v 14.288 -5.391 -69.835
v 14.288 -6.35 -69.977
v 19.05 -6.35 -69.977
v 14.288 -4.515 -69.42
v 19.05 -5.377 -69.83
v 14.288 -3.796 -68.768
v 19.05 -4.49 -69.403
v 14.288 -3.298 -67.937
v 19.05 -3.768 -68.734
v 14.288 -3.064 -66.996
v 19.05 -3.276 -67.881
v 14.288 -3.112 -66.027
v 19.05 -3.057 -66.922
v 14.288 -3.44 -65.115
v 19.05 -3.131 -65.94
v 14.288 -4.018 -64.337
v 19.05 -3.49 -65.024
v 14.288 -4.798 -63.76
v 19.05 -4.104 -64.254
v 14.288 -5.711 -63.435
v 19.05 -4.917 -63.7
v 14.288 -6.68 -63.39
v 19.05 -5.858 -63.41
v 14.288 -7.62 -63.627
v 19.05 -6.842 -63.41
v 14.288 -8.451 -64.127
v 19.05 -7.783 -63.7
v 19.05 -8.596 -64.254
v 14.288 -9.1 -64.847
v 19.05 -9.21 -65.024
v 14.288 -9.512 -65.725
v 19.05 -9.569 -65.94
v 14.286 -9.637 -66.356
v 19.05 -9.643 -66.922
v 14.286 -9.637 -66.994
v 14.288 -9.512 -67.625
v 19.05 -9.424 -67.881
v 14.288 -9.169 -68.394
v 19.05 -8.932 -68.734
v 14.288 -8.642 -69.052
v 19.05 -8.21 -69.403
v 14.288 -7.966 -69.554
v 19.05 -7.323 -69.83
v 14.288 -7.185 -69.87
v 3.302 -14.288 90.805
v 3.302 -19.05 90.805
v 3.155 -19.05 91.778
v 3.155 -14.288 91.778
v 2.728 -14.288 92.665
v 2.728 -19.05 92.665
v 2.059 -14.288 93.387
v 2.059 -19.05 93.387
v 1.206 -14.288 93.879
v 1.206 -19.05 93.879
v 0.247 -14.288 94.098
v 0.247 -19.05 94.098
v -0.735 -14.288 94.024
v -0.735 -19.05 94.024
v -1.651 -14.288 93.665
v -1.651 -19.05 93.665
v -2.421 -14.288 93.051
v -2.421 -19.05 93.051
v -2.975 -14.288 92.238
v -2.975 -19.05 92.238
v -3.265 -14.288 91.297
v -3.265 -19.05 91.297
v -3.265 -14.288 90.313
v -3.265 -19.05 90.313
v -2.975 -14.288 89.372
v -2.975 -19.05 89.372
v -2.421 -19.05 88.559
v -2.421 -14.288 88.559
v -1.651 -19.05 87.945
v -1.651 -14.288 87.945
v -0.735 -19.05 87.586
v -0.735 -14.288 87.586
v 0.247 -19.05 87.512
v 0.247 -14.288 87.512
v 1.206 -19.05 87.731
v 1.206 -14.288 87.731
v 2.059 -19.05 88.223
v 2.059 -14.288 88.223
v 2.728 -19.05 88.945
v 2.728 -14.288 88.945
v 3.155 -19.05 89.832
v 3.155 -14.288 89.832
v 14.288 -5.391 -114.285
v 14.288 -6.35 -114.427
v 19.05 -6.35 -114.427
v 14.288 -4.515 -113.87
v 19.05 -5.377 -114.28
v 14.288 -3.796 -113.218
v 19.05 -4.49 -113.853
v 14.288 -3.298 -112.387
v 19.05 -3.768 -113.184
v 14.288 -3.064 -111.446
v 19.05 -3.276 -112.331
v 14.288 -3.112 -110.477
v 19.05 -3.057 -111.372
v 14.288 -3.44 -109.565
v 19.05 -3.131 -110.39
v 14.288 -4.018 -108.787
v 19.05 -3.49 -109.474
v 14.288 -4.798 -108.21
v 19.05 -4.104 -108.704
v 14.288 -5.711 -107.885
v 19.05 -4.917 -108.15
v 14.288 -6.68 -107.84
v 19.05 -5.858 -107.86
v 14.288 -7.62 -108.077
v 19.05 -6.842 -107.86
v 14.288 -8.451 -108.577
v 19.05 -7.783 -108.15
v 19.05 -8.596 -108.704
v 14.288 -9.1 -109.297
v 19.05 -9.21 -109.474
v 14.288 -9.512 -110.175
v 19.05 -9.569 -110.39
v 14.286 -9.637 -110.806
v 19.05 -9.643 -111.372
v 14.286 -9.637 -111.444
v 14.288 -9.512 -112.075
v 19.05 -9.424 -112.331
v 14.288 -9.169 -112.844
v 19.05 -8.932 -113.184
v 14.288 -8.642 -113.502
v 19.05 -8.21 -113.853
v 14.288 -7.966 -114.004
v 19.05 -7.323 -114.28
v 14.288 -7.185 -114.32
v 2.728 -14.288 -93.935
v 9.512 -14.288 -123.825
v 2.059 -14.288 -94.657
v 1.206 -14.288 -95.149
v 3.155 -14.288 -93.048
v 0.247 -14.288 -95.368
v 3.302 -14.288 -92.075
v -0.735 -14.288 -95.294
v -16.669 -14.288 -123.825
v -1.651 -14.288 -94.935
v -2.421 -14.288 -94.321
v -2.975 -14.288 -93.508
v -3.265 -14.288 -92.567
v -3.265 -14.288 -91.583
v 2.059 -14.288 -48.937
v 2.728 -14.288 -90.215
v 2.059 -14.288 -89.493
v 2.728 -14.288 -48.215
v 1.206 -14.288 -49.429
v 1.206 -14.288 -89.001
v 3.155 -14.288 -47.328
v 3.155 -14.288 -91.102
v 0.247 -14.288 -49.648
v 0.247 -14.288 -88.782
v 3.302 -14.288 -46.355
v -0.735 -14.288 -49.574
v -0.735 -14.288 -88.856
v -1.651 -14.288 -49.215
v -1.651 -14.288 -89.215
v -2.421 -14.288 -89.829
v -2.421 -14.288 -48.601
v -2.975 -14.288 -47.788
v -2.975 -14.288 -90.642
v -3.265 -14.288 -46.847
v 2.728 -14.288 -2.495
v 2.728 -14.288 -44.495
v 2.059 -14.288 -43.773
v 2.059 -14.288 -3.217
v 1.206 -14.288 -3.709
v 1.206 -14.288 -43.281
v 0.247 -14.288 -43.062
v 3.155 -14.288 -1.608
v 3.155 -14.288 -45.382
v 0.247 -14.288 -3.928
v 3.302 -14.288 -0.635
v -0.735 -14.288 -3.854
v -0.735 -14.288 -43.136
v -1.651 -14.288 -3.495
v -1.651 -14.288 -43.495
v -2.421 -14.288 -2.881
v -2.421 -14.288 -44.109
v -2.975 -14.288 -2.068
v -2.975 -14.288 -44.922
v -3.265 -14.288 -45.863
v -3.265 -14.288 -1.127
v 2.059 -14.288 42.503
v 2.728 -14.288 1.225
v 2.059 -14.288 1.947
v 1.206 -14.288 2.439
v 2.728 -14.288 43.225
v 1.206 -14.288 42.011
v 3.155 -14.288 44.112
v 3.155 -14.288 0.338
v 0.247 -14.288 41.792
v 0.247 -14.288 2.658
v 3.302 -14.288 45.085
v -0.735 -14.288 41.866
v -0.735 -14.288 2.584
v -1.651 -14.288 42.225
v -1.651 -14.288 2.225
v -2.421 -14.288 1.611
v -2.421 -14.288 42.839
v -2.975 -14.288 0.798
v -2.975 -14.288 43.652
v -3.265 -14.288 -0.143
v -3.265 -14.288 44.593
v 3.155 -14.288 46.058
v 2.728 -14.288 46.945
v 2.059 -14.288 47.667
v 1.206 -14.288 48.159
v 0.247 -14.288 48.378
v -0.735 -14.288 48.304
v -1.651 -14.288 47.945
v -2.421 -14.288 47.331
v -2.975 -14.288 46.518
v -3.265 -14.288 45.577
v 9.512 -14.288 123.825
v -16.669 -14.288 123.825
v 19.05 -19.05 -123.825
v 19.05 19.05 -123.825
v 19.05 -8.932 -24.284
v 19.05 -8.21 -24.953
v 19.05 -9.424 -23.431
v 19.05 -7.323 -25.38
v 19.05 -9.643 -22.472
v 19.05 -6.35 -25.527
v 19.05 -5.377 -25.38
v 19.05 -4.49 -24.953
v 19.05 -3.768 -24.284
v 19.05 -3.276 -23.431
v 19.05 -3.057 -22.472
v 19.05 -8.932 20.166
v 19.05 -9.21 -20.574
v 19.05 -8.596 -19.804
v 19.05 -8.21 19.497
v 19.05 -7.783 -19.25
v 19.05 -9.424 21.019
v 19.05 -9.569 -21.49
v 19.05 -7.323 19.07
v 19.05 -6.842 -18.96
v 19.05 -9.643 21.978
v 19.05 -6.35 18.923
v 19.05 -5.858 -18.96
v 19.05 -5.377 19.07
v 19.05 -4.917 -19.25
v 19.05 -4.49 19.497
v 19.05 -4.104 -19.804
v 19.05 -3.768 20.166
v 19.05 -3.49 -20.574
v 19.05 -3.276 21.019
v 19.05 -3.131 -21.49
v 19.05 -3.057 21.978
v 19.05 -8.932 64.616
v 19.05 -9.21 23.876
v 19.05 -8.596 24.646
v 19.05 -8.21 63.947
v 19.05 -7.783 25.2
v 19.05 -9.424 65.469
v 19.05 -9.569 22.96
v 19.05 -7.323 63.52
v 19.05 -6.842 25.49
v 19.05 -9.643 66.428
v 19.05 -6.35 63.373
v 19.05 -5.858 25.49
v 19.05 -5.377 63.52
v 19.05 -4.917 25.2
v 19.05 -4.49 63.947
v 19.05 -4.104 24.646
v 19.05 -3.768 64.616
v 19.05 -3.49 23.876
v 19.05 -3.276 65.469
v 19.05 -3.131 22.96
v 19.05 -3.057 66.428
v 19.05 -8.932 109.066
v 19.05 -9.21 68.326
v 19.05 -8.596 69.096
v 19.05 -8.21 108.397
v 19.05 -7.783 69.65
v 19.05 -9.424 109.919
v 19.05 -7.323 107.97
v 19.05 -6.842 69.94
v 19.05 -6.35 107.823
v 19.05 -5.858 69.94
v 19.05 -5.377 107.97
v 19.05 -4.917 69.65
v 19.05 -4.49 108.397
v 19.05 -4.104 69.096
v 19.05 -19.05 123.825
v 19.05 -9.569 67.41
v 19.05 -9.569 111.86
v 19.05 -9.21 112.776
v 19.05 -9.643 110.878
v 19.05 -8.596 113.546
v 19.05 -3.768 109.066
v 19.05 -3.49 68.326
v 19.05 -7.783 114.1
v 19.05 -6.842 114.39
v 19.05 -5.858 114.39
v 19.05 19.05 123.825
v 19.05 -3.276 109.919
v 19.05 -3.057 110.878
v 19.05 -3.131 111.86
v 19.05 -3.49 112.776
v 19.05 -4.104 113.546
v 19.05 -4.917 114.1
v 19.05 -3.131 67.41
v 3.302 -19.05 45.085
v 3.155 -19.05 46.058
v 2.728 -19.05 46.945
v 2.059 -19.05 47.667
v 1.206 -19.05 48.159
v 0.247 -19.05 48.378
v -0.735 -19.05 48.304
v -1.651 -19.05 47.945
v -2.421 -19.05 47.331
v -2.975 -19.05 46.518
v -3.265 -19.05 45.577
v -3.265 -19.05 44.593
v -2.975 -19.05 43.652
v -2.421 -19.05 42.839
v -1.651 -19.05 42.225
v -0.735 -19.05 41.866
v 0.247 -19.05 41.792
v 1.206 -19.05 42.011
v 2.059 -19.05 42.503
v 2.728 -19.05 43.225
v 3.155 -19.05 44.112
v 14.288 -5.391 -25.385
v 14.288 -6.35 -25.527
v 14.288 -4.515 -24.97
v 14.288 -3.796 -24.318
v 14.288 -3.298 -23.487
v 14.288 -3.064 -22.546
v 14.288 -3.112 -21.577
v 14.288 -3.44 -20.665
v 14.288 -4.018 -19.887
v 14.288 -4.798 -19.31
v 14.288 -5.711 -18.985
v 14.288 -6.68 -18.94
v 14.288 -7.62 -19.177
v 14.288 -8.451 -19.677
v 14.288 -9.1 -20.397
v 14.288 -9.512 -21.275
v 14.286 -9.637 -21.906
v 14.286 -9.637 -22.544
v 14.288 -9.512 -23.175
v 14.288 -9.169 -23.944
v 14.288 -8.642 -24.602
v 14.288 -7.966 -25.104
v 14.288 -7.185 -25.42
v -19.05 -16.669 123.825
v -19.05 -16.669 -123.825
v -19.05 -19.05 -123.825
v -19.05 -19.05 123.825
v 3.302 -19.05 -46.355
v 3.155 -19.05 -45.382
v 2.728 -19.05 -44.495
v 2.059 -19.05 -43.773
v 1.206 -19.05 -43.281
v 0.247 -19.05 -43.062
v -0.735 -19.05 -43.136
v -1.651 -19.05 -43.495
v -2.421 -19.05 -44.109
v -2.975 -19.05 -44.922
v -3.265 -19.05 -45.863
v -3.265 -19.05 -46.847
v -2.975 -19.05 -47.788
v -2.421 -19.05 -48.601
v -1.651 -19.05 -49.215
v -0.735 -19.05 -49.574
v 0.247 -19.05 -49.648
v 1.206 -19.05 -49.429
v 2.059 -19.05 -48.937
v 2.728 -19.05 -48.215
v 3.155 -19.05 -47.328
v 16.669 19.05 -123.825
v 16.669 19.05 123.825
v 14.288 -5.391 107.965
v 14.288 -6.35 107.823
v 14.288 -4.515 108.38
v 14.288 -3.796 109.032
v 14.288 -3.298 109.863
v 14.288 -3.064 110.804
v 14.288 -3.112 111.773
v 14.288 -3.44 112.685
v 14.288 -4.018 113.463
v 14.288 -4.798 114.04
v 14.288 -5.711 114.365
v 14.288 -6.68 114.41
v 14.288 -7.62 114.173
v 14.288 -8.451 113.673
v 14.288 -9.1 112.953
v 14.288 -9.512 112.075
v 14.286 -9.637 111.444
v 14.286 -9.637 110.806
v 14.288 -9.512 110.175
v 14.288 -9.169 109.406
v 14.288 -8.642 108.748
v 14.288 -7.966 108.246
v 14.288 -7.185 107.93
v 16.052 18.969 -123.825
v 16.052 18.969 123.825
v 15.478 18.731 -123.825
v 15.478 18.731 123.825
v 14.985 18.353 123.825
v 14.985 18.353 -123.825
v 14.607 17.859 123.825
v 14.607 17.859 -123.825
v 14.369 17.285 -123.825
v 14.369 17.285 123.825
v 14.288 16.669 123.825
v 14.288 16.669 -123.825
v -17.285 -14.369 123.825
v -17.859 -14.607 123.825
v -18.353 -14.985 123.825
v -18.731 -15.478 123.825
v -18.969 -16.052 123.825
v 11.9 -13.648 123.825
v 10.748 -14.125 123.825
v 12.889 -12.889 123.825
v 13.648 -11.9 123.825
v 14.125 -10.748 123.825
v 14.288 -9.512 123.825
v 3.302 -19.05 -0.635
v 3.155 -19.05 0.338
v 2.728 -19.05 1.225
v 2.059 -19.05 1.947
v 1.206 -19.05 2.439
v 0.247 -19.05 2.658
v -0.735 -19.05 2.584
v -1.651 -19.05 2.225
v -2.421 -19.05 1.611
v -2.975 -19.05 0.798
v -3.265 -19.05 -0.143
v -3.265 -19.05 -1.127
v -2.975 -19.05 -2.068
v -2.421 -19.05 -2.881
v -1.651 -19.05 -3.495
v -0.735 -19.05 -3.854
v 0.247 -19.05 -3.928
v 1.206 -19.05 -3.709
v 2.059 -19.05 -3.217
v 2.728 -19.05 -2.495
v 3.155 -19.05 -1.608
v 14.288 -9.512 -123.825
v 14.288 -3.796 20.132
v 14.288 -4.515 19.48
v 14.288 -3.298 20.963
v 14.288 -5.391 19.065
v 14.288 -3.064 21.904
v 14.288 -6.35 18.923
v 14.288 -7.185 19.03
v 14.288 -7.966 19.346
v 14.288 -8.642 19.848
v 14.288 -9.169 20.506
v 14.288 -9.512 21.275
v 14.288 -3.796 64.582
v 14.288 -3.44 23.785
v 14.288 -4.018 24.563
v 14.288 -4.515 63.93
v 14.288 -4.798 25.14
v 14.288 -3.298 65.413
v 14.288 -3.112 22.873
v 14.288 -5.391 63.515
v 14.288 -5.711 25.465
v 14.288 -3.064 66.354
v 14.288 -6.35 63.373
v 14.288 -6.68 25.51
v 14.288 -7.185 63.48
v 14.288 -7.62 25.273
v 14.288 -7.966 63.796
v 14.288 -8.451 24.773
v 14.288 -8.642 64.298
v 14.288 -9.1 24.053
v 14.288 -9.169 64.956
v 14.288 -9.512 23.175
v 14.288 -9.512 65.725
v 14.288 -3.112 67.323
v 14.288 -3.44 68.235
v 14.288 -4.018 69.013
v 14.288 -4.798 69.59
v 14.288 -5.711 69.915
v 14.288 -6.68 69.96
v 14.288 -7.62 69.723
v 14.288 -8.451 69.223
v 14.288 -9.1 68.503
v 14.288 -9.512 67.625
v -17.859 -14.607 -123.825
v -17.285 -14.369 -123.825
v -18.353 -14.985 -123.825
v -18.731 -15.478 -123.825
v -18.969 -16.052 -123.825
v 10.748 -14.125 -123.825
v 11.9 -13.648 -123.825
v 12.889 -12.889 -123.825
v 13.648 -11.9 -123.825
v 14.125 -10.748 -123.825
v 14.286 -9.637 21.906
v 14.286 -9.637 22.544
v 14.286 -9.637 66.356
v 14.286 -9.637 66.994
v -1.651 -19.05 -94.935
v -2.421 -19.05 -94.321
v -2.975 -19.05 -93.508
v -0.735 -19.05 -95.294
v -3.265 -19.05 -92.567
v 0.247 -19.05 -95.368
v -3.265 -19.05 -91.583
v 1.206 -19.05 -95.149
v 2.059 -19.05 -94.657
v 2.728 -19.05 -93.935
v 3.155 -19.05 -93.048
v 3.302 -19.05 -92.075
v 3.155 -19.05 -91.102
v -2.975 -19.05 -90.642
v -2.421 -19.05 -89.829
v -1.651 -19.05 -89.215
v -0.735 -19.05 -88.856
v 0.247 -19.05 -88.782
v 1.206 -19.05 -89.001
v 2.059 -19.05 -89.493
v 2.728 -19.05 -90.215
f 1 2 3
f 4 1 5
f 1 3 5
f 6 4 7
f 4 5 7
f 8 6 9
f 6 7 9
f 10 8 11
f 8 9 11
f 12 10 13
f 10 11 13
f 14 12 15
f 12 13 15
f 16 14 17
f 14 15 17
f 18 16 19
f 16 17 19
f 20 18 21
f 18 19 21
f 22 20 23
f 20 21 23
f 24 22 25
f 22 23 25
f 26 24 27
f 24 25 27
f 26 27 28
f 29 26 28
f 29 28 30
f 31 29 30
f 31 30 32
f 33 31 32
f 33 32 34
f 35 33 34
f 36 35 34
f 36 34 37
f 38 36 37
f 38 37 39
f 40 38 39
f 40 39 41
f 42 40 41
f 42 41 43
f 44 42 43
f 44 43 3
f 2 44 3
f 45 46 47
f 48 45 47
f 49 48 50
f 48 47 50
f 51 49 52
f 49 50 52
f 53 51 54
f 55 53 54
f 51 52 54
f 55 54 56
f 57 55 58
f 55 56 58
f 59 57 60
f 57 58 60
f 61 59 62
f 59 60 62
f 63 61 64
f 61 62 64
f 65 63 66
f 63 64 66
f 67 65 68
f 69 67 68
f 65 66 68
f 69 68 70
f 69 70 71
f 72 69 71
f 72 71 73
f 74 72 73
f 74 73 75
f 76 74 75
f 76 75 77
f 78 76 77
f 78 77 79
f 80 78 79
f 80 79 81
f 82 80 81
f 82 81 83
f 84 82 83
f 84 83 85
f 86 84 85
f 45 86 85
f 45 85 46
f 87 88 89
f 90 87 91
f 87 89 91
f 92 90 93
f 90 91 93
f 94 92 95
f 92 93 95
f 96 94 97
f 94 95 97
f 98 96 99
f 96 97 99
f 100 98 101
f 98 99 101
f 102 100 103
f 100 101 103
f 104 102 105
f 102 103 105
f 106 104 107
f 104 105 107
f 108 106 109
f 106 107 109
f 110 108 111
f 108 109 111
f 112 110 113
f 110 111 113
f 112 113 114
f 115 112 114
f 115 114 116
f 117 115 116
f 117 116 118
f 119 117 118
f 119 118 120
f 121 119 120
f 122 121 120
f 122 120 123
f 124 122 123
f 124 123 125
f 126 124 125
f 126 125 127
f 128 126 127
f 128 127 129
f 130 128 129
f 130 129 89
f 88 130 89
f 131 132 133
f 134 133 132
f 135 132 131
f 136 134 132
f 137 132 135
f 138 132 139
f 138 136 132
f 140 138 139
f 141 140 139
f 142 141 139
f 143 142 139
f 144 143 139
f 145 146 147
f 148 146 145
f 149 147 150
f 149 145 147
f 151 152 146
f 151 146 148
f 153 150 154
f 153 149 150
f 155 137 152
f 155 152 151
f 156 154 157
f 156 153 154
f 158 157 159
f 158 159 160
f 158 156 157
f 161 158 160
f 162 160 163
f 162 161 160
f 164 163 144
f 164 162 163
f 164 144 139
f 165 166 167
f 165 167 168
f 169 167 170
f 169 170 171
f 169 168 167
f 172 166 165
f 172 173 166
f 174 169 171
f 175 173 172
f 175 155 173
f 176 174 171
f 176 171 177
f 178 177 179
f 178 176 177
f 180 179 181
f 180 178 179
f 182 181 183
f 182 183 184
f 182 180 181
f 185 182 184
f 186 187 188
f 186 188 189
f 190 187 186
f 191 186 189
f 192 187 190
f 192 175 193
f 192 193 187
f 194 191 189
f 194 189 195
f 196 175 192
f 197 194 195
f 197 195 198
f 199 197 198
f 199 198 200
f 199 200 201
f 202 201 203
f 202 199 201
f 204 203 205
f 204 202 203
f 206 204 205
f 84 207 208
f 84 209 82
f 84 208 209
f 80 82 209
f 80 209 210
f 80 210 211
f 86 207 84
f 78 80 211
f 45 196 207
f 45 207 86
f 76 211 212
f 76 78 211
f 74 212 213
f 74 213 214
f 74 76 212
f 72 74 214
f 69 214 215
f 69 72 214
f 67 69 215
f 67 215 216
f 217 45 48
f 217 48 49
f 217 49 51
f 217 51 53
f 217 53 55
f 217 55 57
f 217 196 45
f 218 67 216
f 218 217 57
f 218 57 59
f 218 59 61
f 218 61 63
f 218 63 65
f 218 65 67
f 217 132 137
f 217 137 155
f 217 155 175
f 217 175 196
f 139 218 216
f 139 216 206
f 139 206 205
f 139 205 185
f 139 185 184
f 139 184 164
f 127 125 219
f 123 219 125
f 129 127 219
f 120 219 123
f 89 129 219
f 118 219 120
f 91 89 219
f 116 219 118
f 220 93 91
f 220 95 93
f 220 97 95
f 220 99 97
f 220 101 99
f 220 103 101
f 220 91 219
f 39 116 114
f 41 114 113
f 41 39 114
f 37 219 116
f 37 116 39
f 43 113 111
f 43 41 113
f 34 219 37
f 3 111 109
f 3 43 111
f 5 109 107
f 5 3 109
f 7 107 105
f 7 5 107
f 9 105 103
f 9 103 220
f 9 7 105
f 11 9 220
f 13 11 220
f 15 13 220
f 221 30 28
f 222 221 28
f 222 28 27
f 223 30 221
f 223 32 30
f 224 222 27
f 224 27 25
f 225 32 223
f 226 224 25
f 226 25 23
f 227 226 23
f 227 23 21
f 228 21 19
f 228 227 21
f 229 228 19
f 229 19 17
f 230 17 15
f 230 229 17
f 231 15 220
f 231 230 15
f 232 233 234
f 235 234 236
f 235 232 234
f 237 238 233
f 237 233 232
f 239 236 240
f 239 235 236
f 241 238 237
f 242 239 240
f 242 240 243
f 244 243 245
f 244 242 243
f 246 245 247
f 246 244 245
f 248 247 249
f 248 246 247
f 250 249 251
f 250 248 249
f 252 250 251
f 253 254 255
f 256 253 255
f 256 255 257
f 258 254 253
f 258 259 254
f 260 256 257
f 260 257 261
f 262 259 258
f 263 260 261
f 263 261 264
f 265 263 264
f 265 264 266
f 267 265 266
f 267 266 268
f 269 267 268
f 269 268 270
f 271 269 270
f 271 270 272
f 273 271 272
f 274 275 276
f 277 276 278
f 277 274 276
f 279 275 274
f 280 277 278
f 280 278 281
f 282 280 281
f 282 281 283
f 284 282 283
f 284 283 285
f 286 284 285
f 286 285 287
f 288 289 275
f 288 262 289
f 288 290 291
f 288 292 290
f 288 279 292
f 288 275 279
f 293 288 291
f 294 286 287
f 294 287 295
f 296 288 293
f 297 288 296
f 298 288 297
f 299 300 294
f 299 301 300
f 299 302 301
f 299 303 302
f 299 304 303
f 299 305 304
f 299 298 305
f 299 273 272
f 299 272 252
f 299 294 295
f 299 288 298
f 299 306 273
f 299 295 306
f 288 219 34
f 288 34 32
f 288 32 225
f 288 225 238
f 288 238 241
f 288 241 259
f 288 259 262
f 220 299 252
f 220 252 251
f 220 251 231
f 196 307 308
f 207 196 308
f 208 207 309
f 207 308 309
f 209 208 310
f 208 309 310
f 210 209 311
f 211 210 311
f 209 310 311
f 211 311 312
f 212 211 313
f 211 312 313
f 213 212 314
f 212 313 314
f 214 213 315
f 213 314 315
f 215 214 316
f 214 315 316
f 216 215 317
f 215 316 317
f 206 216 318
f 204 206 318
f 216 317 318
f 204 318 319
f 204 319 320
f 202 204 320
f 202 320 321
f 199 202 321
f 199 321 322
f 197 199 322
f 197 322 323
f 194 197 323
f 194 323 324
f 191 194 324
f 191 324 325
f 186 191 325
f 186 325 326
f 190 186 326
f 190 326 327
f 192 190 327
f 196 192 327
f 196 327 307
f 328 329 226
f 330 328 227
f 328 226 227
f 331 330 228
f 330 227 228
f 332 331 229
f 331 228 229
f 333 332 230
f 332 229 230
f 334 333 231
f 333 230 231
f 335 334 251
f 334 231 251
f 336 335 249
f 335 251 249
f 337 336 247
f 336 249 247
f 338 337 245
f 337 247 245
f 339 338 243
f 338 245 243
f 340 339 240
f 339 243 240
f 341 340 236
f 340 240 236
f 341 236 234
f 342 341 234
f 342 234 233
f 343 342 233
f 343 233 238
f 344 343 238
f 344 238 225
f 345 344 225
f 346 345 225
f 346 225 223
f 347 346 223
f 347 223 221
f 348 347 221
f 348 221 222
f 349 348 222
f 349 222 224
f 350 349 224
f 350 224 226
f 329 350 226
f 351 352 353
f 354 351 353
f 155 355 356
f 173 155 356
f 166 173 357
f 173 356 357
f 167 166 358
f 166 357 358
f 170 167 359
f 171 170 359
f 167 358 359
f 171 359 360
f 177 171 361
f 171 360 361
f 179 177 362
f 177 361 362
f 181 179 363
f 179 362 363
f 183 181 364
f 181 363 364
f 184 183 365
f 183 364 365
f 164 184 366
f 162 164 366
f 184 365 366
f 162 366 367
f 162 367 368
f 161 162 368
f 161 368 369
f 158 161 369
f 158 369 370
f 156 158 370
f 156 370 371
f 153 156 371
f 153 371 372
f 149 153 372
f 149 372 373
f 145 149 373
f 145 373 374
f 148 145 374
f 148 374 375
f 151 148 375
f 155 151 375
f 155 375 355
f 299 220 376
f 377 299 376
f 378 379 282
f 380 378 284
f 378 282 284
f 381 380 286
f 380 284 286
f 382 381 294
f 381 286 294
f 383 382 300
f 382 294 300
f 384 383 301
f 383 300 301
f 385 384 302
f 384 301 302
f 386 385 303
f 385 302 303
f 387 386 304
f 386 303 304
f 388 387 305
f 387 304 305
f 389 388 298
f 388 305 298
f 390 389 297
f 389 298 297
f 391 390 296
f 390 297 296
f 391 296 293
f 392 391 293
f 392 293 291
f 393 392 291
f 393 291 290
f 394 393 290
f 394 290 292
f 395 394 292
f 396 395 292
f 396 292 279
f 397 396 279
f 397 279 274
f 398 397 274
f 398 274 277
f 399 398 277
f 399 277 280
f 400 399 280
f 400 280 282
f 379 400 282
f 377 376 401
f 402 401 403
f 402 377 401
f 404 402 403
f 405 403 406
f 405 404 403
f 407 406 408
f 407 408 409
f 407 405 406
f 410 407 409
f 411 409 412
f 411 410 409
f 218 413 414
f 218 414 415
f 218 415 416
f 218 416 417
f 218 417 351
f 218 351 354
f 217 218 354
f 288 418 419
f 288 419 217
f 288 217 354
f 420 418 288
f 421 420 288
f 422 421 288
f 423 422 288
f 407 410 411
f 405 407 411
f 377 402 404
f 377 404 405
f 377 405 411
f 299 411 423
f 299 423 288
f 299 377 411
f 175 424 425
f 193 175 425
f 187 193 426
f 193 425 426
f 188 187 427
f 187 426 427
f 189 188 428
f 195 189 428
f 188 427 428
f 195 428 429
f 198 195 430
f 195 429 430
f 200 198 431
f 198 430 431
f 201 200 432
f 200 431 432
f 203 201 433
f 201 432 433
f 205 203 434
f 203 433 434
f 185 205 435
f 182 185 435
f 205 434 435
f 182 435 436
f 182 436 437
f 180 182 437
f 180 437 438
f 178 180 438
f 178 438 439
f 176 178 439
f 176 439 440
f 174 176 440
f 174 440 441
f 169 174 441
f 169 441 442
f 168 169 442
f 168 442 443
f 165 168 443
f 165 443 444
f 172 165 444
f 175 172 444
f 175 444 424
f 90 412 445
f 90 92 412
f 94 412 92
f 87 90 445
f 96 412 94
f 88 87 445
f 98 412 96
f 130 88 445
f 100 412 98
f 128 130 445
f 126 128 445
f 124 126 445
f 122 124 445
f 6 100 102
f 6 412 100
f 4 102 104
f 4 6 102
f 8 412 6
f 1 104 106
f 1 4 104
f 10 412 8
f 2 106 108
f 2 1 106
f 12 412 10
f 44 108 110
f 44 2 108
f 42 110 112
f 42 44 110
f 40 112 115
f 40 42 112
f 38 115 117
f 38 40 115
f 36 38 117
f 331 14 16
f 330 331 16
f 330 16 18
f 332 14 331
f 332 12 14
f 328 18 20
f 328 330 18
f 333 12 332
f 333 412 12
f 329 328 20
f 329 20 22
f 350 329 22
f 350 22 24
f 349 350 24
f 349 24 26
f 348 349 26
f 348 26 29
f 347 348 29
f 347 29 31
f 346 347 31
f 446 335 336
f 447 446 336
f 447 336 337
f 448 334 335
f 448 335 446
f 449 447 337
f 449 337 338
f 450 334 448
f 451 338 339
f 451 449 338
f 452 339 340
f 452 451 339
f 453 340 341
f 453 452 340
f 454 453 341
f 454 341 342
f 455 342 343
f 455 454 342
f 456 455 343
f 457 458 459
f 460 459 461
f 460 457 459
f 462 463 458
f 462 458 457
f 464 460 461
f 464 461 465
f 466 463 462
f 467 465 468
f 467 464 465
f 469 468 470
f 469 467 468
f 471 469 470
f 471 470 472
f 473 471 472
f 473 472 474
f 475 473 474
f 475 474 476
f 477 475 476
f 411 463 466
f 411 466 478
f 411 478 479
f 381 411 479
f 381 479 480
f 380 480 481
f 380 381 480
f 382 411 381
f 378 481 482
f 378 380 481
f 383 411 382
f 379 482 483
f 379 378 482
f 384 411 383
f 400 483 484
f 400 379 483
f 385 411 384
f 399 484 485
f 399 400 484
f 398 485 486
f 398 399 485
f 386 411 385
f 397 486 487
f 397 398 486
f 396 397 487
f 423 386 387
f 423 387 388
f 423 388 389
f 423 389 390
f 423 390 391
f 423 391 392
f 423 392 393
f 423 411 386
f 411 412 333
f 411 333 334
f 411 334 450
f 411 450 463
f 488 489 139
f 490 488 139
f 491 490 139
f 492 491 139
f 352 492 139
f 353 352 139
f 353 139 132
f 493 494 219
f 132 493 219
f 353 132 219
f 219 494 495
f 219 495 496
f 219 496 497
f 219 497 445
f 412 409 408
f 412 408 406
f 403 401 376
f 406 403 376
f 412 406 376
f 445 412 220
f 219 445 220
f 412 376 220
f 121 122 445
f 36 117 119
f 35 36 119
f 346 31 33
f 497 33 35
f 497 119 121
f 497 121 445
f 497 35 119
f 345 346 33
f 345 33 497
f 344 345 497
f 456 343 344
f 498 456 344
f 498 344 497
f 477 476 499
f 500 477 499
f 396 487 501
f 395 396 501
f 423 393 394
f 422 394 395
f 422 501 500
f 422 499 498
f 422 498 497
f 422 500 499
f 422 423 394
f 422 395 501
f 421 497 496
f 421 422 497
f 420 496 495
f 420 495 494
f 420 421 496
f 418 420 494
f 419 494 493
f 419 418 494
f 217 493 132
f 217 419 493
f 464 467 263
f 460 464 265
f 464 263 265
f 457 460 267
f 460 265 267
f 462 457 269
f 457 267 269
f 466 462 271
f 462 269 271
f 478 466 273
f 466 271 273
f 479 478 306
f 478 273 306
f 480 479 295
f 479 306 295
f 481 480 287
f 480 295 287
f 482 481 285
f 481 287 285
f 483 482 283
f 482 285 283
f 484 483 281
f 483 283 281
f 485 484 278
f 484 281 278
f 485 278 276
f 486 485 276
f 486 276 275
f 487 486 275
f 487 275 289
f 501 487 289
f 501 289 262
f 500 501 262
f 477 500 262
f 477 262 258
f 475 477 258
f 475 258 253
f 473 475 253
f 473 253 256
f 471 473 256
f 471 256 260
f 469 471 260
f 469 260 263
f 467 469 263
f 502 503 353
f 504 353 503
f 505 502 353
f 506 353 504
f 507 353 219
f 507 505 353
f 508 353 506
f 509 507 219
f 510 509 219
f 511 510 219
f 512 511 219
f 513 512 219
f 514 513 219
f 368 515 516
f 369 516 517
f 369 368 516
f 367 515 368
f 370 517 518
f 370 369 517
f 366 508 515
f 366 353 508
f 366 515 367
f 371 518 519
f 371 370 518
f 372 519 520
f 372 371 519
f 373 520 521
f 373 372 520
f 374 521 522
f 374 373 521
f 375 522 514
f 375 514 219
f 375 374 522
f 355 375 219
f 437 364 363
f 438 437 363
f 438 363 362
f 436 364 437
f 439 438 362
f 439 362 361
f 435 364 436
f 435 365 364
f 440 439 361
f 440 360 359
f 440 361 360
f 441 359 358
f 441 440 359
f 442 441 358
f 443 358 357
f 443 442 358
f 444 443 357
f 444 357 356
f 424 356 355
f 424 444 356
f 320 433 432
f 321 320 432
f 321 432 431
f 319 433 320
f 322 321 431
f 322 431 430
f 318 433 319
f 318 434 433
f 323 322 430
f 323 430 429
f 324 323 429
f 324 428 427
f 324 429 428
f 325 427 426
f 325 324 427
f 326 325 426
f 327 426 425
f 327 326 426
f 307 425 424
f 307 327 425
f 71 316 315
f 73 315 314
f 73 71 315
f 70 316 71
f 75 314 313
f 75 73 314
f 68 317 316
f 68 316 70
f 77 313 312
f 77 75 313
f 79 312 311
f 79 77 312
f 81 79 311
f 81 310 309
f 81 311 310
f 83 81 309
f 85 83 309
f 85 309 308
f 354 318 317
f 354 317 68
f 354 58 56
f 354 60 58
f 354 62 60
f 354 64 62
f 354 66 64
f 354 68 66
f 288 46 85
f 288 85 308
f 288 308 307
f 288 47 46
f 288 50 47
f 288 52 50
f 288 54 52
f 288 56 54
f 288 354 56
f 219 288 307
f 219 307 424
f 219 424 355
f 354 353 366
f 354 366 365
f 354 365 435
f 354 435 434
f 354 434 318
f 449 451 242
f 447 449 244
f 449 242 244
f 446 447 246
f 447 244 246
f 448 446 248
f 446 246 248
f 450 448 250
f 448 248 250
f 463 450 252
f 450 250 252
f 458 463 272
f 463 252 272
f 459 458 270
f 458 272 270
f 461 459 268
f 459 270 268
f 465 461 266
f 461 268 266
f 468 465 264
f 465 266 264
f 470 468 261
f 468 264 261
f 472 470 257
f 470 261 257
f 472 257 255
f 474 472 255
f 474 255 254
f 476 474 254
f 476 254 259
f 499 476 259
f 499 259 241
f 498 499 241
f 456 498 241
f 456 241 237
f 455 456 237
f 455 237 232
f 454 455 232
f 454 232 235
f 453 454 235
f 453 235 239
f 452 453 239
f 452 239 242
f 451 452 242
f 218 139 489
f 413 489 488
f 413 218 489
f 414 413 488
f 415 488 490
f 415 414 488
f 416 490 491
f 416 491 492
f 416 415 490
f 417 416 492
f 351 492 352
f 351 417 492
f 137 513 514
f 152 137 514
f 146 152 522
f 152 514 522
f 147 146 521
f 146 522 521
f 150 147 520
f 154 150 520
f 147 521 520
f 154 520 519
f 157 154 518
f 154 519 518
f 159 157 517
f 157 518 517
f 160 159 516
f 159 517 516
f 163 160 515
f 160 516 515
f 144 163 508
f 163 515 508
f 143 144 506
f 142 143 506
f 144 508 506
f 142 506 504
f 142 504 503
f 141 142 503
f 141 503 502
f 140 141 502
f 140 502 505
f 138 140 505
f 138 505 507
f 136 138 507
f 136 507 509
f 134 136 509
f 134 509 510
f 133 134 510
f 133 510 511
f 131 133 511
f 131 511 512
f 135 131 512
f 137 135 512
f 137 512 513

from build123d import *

# Parameters (mm, degrees)
BOSS_EXTRUDE1_DEPTH = 123.825
CUT_EXTRUDE1_REACH  = 40.1
SKETCH3_R           = 3.302
CUT_EXTRUDE2_REACH  = 40.1
SKETCH4_R           = 3.302


with BuildPart() as part:
    # Sketch2 → Boss-Extrude1 (new body, symmetric)
    with BuildSketch(Plane.XY):
        with BuildLine():
            Line((-19.05, -19.05), (19.05, -19.05))
            Line((19.05, -19.05), (19.05, 19.05))
            Line((19.05, 19.05), (16.66875, 19.05))
            ThreePointArc((16.66875, 19.05), (14.984951977, 18.352548023), (14.2875, 16.66875))
            Line((14.2875, 16.66875), (14.2875, -9.5123))
            ThreePointArc((14.2875, -9.5123), (12.888876302, -12.888876302), (9.5123, -14.2875))
            Line((9.5123, -14.2875), (-16.66875, -14.2875))
            ThreePointArc((-16.66875, -14.2875), (-18.352548023, -14.984951977), (-19.05, -16.66875))
            Line((-19.05, -16.66875), (-19.05, -19.05))
        make_face()
    extrude(amount=BOSS_EXTRUDE1_DEPTH, both=True)

    # Sketch3 → Cut-Extrude1 (cut, up to next)
    with BuildSketch(Plane(origin=(19.05, 0, 0), x_dir=(0, 0, -1), z_dir=(1, 0, 0)), mode=Mode.PRIVATE) as cut_extrude1_sk1:
        with Locations((111.125, -6.35)):
            Circle(SKETCH3_R)
    cut_extrude1_tool1 = extrude(cut_extrude1_sk1.sketch, amount=-CUT_EXTRUDE1_REACH, mode=Mode.PRIVATE) & part.part
    add(cut_extrude1_tool1.solids().sort_by_distance((19.05, -6.35, -111.125))[0], mode=Mode.SUBTRACT)
    # Sketch3 → Cut-Extrude1 (cut, up to next)
    with BuildSketch(Plane(origin=(19.05, 0, 0), x_dir=(0, 0, -1), z_dir=(1, 0, 0)), mode=Mode.PRIVATE) as cut_extrude1_sk2:
        with Locations((66.675, -6.35)):
            Circle(SKETCH3_R)
    cut_extrude1_tool2 = extrude(cut_extrude1_sk2.sketch, amount=-CUT_EXTRUDE1_REACH, mode=Mode.PRIVATE) & part.part
    add(cut_extrude1_tool2.solids().sort_by_distance((19.05, -6.35, -66.675))[0], mode=Mode.SUBTRACT)
    # Sketch3 → Cut-Extrude1 (cut, up to next)
    with BuildSketch(Plane(origin=(19.05, 0, 0), x_dir=(0, 0, -1), z_dir=(1, 0, 0)), mode=Mode.PRIVATE) as cut_extrude1_sk3:
        with Locations((22.225, -6.35)):
            Circle(SKETCH3_R)
    cut_extrude1_tool3 = extrude(cut_extrude1_sk3.sketch, amount=-CUT_EXTRUDE1_REACH, mode=Mode.PRIVATE) & part.part
    add(cut_extrude1_tool3.solids().sort_by_distance((19.05, -6.35, -22.225))[0], mode=Mode.SUBTRACT)
    # Sketch3 → Cut-Extrude1 (cut, up to next)
    with BuildSketch(Plane(origin=(19.05, 0, 0), x_dir=(0, 0, -1), z_dir=(1, 0, 0)), mode=Mode.PRIVATE) as cut_extrude1_sk4:
        with Locations((-22.225, -6.35)):
            Circle(SKETCH3_R)
    cut_extrude1_tool4 = extrude(cut_extrude1_sk4.sketch, amount=-CUT_EXTRUDE1_REACH, mode=Mode.PRIVATE) & part.part
    add(cut_extrude1_tool4.solids().sort_by_distance((19.05, -6.35, 22.225))[0], mode=Mode.SUBTRACT)
    # Sketch3 → Cut-Extrude1 (cut, up to next)
    with BuildSketch(Plane(origin=(19.05, 0, 0), x_dir=(0, 0, -1), z_dir=(1, 0, 0)), mode=Mode.PRIVATE) as cut_extrude1_sk5:
        with Locations((-66.675, -6.35)):
            Circle(SKETCH3_R)
    cut_extrude1_tool5 = extrude(cut_extrude1_sk5.sketch, amount=-CUT_EXTRUDE1_REACH, mode=Mode.PRIVATE) & part.part
    add(cut_extrude1_tool5.solids().sort_by_distance((19.05, -6.35, 66.675))[0], mode=Mode.SUBTRACT)
    # Sketch3 → Cut-Extrude1 (cut, up to next)
    with BuildSketch(Plane(origin=(19.05, 0, 0), x_dir=(0, 0, -1), z_dir=(1, 0, 0)), mode=Mode.PRIVATE) as cut_extrude1_sk6:
        with Locations((-111.125, -6.35)):
            Circle(SKETCH3_R)
    cut_extrude1_tool6 = extrude(cut_extrude1_sk6.sketch, amount=-CUT_EXTRUDE1_REACH, mode=Mode.PRIVATE) & part.part
    add(cut_extrude1_tool6.solids().sort_by_distance((19.05, -6.35, 111.125))[0], mode=Mode.SUBTRACT)

    # Sketch4 → Cut-Extrude2 (cut, up to next)
    with BuildSketch(Plane.XZ.offset(19.05), mode=Mode.PRIVATE) as cut_extrude2_sk1:
        with Locations((0, -92.075)):
            Circle(SKETCH4_R)
    cut_extrude2_tool1 = extrude(cut_extrude2_sk1.sketch, amount=-CUT_EXTRUDE2_REACH, mode=Mode.PRIVATE) & part.part
    add(cut_extrude2_tool1.solids().sort_by_distance((0, -19.05, -92.075))[0], mode=Mode.SUBTRACT)
    # Sketch4 → Cut-Extrude2 (cut, up to next)
    with BuildSketch(Plane.XZ.offset(19.05), mode=Mode.PRIVATE) as cut_extrude2_sk2:
        with Locations((0, -46.355)):
            Circle(SKETCH4_R)
    cut_extrude2_tool2 = extrude(cut_extrude2_sk2.sketch, amount=-CUT_EXTRUDE2_REACH, mode=Mode.PRIVATE) & part.part
    add(cut_extrude2_tool2.solids().sort_by_distance((0, -19.05, -46.355))[0], mode=Mode.SUBTRACT)
    # Sketch4 → Cut-Extrude2 (cut, up to next)
    with BuildSketch(Plane.XZ.offset(19.05), mode=Mode.PRIVATE) as cut_extrude2_sk3:
        with Locations((0, -0.635)):
            Circle(SKETCH4_R)
    cut_extrude2_tool3 = extrude(cut_extrude2_sk3.sketch, amount=-CUT_EXTRUDE2_REACH, mode=Mode.PRIVATE) & part.part
    add(cut_extrude2_tool3.solids().sort_by_distance((0, -19.05, -0.635))[0], mode=Mode.SUBTRACT)
    # Sketch4 → Cut-Extrude2 (cut, up to next)
    with BuildSketch(Plane.XZ.offset(19.05), mode=Mode.PRIVATE) as cut_extrude2_sk4:
        with Locations((0, 45.085)):
            Circle(SKETCH4_R)
    cut_extrude2_tool4 = extrude(cut_extrude2_sk4.sketch, amount=-CUT_EXTRUDE2_REACH, mode=Mode.PRIVATE) & part.part
    add(cut_extrude2_tool4.solids().sort_by_distance((0, -19.05, 45.085))[0], mode=Mode.SUBTRACT)
    # Sketch4 → Cut-Extrude2 (cut, up to next)
    with BuildSketch(Plane.XZ.offset(19.05), mode=Mode.PRIVATE) as cut_extrude2_sk5:
        with Locations((0, 90.805)):
            Circle(SKETCH4_R)
    cut_extrude2_tool5 = extrude(cut_extrude2_sk5.sketch, amount=-CUT_EXTRUDE2_REACH, mode=Mode.PRIVATE) & part.part
    add(cut_extrude2_tool5.solids().sort_by_distance((0, -19.05, 90.805))[0], mode=Mode.SUBTRACT)


solid = part.part
